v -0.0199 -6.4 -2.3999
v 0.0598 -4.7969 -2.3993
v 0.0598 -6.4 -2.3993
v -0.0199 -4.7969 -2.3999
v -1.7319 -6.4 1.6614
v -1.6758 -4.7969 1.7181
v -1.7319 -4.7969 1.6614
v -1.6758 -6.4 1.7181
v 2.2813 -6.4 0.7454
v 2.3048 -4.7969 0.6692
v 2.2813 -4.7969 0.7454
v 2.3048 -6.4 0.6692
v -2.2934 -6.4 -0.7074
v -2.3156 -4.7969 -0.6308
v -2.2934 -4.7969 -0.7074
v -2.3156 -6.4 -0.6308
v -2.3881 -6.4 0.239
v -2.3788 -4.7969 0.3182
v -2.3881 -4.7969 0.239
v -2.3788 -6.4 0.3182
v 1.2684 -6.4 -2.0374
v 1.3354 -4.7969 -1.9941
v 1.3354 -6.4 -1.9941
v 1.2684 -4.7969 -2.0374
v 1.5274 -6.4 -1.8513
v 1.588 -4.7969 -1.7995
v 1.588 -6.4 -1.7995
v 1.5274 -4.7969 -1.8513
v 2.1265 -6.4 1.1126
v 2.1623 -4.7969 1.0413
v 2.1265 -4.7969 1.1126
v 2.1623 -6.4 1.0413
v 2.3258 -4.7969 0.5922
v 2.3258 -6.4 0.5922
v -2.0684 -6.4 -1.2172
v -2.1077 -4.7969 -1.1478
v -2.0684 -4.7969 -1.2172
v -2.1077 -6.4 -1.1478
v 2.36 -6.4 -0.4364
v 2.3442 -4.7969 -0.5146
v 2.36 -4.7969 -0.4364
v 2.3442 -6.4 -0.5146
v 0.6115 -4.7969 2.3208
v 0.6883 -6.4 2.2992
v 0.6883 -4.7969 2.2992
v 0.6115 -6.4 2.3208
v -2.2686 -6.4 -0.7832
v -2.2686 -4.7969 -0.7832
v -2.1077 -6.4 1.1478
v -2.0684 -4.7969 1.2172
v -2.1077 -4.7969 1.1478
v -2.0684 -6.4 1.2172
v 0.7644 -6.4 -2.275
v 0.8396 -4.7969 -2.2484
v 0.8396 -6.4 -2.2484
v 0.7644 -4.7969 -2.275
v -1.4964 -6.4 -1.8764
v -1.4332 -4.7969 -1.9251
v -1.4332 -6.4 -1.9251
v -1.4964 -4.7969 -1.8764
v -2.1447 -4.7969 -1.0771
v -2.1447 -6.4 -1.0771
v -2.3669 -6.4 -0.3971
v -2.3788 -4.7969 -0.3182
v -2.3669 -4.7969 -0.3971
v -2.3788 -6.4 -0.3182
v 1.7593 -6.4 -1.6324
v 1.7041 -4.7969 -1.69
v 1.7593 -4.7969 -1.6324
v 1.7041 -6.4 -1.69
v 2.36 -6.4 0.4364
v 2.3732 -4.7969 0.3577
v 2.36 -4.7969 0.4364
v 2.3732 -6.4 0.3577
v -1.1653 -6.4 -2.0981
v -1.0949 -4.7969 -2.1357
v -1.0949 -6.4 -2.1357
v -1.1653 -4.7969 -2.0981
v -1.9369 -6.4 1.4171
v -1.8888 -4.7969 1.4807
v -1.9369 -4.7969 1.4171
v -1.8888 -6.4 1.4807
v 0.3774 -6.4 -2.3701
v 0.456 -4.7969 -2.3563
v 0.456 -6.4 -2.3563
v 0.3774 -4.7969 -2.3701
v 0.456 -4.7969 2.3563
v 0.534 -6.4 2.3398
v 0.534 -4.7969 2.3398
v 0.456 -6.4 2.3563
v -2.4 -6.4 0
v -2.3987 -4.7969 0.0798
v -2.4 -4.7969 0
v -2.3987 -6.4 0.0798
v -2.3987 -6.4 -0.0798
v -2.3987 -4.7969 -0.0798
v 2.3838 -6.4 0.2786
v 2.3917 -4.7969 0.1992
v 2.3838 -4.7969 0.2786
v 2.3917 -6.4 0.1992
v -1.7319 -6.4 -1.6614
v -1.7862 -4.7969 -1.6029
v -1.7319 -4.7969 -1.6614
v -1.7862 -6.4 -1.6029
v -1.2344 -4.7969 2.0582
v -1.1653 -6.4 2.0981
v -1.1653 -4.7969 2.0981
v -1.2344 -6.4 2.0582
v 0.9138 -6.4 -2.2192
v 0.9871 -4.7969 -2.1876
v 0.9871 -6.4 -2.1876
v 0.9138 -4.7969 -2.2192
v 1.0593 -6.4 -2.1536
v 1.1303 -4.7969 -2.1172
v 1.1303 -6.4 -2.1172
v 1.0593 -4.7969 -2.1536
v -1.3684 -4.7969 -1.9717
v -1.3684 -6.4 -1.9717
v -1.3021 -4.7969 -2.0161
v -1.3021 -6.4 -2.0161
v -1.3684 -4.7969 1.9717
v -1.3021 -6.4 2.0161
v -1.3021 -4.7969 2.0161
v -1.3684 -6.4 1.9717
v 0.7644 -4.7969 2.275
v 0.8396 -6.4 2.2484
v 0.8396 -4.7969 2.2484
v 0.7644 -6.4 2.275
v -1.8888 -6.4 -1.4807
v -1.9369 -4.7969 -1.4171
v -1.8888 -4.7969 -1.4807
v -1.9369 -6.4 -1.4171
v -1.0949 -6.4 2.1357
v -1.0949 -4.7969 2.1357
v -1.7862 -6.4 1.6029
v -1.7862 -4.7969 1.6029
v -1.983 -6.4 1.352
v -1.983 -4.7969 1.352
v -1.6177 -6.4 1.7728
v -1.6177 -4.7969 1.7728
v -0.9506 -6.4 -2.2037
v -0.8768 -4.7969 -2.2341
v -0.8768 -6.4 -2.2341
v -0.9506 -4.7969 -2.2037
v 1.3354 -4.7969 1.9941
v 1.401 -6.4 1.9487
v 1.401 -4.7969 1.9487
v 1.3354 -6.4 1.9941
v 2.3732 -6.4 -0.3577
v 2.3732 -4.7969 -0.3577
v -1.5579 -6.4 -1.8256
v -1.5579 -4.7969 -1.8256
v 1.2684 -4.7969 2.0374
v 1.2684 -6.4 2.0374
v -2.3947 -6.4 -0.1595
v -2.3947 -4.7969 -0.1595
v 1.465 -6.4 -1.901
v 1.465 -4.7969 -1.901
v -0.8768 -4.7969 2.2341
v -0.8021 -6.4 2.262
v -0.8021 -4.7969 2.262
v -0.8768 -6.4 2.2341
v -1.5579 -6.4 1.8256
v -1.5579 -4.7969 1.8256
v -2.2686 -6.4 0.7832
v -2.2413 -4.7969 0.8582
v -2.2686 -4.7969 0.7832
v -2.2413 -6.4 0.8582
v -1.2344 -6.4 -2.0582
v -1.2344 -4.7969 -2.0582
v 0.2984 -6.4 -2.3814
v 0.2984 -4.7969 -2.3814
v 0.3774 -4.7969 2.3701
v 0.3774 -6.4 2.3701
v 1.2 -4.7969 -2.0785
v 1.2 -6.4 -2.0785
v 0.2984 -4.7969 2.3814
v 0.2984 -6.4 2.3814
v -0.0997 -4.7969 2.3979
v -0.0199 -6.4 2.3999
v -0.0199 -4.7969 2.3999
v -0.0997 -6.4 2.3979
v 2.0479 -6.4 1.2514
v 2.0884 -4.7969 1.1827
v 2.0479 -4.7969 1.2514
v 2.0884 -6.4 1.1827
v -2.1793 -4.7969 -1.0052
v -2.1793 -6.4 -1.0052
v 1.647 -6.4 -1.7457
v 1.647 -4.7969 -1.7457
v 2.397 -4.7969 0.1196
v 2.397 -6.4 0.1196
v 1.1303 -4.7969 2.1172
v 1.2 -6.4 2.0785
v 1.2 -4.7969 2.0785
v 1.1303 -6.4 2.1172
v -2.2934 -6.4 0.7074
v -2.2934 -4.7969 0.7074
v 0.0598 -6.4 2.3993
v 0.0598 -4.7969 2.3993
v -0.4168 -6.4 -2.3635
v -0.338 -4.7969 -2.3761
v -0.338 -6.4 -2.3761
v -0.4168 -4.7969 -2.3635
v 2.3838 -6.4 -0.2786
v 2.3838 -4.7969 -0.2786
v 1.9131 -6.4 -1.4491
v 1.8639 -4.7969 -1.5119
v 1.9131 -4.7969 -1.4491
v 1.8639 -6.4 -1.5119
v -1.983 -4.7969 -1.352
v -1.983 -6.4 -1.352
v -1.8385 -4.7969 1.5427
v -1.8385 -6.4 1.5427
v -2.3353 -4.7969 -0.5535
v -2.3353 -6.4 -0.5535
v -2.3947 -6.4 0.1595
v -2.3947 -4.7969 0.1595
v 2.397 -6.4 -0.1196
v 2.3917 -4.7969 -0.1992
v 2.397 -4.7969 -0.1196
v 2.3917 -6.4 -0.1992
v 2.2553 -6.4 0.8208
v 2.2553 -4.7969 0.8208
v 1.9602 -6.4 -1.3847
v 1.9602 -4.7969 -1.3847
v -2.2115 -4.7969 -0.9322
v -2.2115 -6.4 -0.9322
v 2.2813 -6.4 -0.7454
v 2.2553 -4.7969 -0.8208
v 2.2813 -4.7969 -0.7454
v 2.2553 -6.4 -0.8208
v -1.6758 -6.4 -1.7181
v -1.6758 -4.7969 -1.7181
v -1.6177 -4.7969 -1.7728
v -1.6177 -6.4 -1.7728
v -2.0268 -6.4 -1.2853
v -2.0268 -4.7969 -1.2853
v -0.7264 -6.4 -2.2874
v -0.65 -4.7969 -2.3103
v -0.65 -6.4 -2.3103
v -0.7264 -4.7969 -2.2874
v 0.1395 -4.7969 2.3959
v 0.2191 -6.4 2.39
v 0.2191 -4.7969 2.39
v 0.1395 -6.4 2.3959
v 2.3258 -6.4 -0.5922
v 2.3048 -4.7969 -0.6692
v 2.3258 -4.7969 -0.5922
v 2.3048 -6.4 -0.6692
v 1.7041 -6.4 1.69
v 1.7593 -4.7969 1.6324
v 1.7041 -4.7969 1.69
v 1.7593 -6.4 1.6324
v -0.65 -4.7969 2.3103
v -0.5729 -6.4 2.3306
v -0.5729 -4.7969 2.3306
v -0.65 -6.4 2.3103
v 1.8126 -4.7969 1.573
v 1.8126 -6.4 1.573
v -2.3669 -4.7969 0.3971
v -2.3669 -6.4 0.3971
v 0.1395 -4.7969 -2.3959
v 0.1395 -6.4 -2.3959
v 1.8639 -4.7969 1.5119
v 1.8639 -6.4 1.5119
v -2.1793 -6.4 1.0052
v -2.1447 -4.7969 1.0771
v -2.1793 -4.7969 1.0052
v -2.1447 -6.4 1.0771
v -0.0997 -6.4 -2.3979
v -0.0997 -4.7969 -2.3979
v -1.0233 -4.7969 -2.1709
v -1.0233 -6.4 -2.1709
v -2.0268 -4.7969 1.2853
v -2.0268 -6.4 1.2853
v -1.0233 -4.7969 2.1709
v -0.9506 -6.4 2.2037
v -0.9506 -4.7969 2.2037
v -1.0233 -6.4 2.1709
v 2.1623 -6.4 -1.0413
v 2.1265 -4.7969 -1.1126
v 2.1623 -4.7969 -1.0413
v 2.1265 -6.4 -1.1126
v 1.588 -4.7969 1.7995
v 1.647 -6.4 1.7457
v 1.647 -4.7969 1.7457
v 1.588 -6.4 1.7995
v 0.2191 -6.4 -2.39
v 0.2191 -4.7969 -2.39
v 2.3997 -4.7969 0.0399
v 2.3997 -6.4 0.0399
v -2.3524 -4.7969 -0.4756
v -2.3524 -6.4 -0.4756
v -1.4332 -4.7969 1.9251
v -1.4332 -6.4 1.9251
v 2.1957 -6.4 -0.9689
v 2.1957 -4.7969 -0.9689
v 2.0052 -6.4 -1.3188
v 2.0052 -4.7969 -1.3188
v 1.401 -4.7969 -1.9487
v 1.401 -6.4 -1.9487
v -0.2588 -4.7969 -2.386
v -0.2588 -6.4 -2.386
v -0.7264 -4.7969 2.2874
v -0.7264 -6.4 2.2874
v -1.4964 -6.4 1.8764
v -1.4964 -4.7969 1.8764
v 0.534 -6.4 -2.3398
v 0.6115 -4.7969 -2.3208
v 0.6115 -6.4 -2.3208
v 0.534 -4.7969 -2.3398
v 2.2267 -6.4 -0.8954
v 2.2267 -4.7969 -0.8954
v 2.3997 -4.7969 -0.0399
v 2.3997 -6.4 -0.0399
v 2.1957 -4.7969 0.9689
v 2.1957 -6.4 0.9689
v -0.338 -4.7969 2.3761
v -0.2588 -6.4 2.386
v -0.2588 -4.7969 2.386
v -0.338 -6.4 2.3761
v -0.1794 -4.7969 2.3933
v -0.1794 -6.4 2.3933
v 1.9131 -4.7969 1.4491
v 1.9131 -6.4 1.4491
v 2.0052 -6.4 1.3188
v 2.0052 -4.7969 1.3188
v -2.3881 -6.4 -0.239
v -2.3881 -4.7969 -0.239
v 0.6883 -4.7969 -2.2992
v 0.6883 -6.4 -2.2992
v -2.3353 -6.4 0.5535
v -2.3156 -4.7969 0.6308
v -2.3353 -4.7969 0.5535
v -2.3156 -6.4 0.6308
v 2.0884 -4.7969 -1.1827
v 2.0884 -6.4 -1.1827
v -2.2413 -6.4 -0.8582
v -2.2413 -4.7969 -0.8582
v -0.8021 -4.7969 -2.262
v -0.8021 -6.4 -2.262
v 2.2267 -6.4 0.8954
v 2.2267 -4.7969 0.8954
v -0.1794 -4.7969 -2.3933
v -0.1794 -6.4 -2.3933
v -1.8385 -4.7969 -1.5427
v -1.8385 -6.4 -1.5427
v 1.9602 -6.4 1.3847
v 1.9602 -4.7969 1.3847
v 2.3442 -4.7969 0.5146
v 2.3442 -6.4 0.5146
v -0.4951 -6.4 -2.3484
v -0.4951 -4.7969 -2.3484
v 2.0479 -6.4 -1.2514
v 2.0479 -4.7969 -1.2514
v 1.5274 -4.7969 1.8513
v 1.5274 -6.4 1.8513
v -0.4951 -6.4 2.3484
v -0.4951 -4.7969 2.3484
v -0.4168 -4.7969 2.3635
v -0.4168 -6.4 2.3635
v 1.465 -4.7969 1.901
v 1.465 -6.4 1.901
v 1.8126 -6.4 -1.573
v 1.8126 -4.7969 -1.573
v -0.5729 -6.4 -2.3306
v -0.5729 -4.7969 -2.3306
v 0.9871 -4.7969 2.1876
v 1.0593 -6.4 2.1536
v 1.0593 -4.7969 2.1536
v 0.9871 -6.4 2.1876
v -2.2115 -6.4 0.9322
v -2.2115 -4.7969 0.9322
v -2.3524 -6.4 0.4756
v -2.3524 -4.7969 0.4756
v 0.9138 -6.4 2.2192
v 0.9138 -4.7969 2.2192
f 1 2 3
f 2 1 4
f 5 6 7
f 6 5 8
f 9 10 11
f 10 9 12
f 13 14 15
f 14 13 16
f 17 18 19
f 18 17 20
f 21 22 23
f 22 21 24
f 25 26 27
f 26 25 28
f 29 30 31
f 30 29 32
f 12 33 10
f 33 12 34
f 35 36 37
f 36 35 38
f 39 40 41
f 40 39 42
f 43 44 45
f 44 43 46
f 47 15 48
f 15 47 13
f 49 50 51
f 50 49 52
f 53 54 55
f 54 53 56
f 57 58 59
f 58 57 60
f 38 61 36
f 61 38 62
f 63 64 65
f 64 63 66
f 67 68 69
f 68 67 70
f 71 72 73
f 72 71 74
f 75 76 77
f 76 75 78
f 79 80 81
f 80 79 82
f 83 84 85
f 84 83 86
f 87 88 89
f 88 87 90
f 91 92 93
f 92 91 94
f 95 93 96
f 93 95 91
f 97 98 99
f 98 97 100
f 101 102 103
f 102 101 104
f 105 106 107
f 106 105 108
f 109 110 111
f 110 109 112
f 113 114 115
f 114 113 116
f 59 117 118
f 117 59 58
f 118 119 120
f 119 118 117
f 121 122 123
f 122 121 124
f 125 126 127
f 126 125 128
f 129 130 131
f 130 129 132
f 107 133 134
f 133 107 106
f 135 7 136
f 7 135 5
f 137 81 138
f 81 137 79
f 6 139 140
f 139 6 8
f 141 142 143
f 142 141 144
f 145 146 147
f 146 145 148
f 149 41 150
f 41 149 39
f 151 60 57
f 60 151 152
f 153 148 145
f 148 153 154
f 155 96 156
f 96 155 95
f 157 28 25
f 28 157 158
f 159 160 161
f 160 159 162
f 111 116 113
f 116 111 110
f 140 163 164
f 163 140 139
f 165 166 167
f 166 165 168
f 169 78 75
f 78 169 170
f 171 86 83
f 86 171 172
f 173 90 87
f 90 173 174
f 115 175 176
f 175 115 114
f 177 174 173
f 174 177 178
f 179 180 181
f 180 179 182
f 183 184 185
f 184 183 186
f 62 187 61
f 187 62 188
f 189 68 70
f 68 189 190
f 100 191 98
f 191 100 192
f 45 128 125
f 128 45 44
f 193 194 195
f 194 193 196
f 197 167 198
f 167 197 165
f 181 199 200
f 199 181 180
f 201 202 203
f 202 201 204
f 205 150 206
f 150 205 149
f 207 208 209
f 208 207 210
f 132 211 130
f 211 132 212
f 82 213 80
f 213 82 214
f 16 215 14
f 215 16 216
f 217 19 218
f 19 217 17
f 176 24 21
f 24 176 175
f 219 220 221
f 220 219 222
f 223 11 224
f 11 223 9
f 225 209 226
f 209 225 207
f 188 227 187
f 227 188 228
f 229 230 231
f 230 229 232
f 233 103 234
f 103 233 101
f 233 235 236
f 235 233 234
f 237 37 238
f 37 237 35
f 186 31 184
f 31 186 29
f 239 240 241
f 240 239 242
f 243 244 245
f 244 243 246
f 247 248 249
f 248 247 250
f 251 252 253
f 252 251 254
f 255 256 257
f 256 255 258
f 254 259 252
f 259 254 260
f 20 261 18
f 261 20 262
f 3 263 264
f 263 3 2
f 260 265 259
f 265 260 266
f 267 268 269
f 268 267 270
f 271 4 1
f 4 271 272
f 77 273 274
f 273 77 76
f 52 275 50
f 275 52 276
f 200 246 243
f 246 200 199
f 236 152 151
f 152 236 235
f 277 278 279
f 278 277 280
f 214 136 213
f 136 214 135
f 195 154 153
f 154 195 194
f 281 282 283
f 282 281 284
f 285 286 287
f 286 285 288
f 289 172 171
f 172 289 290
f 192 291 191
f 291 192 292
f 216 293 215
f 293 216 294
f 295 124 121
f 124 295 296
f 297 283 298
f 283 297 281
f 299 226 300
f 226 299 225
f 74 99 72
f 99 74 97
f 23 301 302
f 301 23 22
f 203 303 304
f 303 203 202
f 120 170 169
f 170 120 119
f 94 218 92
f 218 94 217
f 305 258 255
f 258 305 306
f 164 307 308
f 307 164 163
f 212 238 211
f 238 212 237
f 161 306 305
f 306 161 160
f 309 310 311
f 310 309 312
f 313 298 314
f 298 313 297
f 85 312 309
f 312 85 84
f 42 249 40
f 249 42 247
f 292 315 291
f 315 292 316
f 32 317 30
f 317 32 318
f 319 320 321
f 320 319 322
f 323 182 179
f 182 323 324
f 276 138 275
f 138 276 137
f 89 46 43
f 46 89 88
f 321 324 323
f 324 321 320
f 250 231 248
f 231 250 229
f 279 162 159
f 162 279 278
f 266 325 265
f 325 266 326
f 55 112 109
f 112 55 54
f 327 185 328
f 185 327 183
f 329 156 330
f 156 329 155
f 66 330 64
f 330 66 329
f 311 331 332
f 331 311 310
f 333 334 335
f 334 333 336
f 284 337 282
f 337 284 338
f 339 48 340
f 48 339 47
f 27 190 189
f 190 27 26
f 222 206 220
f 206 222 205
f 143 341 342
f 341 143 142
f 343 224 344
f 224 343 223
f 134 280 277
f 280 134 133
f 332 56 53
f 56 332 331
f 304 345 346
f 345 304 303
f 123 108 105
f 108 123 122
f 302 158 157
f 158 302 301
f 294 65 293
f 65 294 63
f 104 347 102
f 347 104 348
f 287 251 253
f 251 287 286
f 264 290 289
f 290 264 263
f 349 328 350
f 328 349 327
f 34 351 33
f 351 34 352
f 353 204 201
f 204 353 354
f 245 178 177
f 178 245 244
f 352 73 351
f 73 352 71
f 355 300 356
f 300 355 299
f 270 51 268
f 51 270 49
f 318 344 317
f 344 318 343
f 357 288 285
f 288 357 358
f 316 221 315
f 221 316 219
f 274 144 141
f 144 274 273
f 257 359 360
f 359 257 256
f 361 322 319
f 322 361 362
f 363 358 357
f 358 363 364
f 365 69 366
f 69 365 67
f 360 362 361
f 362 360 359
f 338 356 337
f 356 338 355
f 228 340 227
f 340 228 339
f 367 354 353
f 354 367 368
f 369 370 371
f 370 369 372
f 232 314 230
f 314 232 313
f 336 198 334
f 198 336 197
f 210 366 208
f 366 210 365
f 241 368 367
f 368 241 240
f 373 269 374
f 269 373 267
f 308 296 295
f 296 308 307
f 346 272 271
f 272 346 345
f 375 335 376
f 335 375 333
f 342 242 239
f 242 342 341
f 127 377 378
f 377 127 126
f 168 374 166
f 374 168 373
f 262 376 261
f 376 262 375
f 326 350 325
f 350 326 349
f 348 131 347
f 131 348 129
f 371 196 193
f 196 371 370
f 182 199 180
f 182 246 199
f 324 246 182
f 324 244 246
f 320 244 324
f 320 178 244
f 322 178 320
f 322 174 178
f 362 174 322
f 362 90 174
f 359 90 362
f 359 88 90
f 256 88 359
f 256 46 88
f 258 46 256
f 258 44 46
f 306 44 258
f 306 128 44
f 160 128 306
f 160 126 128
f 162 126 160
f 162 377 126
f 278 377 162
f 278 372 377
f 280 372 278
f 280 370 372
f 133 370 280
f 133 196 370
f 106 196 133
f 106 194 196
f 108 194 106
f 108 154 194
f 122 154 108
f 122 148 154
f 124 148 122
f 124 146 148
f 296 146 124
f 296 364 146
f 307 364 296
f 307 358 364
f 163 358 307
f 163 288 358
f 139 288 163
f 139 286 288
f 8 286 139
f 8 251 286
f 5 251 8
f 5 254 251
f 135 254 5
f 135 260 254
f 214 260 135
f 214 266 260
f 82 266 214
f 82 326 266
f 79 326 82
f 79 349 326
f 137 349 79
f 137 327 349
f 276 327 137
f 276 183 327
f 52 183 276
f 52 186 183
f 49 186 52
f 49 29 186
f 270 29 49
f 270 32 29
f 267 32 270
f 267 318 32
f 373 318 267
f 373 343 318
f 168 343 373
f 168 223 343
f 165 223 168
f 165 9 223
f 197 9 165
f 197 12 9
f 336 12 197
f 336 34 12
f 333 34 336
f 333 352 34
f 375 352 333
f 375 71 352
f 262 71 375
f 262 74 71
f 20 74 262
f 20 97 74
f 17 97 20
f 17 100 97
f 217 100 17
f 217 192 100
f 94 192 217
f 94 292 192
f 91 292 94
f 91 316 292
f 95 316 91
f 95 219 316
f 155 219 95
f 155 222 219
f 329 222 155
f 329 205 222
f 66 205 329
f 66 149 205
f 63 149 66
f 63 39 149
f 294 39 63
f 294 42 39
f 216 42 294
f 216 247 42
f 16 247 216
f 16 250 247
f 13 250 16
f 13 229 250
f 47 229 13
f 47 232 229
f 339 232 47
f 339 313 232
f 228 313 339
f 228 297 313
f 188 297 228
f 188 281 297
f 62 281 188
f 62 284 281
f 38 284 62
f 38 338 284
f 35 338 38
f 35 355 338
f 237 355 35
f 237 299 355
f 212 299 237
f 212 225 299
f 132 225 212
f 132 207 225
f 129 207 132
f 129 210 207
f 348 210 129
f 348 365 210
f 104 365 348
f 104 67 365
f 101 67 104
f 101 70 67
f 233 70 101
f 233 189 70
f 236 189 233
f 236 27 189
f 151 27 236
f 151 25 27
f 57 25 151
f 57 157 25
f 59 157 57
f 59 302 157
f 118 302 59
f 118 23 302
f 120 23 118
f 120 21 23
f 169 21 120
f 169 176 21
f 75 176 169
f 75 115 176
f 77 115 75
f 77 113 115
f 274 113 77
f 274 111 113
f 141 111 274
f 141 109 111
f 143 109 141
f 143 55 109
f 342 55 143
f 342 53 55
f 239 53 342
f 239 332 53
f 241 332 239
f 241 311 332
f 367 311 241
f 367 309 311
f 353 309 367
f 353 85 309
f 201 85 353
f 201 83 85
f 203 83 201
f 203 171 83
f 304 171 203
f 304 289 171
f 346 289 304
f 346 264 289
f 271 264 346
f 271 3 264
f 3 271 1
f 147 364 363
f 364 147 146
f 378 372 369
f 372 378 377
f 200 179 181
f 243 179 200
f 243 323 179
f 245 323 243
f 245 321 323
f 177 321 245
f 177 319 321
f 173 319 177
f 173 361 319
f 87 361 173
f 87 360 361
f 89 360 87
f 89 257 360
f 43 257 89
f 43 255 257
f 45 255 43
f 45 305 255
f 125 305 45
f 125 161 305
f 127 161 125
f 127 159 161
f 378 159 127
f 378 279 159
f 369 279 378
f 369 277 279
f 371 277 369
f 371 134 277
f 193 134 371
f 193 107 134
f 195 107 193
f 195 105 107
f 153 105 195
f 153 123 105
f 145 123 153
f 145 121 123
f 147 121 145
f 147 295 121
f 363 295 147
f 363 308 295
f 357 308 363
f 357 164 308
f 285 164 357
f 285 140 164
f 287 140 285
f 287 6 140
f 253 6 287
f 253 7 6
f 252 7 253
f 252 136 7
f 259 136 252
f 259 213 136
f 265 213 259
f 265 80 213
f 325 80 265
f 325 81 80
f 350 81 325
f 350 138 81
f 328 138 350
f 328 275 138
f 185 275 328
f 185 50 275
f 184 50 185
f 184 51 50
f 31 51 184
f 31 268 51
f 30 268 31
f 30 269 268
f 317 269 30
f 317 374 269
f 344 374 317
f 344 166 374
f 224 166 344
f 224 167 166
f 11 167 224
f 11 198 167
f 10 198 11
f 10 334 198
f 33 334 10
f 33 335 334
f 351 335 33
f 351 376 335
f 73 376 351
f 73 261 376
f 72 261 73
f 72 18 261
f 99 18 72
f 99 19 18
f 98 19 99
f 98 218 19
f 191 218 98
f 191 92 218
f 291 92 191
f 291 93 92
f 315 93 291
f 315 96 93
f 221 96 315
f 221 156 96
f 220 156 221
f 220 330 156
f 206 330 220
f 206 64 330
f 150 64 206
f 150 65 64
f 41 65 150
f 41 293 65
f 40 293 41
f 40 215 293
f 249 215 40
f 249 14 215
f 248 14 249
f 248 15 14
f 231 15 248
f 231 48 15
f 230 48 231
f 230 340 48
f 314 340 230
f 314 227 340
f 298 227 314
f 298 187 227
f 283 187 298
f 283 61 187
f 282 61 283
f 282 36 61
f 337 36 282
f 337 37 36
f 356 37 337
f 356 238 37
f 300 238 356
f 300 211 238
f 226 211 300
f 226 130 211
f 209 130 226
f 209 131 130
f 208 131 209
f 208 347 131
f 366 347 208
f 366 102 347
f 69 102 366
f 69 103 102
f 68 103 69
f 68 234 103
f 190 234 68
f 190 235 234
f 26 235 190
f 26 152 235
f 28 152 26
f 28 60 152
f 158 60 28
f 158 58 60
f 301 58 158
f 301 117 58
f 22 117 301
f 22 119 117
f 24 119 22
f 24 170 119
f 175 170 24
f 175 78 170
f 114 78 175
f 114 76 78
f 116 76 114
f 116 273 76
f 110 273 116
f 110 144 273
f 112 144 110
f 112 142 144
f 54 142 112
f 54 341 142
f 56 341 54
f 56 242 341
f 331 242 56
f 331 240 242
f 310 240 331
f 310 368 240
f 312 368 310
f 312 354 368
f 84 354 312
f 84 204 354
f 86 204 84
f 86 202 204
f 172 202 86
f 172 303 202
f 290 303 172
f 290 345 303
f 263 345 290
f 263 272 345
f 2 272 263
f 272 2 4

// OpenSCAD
use <../lib.scad>
use <../p/4-4cylo.scad>
use <../p/4-4ring1.scad>
use <s/243s01.scad>
$fa=1; $fs=0.2;
function ldraw_lib__243(realsolid=false) = [
// 0 ~Train Wheel Spoked with Cylindrical Rim with 8 LDU Axle Hole
// 0 Name: 243.dat
// 0 Author: Niels Karsdorp [nielsk]
// 0 !LDRAW_ORG Part UPDATE 2022-03
// 0 !LICENSE Licensed under CC BY 2.0 and CC BY 4.0 : see CAreadme.txt
// 
// 0 BFC CERTIFY CCW
  [0,"BFC","CERTIFY"],
  [0,"BFC","CCW"],
// 
// 0 !HISTORY 2011-07-25 [PTadmin] Official Update 2011-01
// 0 !HISTORY 2018-03-14 [Holly-Wood] Changed description, fixed flat-scaled primitives, fixed comments, inverted winding to CCW, rotated stud, fixed spokes
// 0 !HISTORY 2019-12-27 [PTadmin] Official Update 2019-03
// 0 !HISTORY 2021-06-10 [Holly-Wood] Subfiled, changed description
// 0 !HISTORY 2022-05-07 [PTadmin] Official Update 2022-03
// 
// 
// 0 // Subfile
// 1 16 0 0 0 1 0 0 0 1 0 0 0 1 s\243s01.dat
  [1,16,0,0,0,1,0,0,0,1,0,0,0,1, ldraw_lib__s__243s01(realsolid)],
// 
// 0 // Axle connector
// 1 16 0 0 10 -4 0 0 0 0 4 0 -1 0 4-4ring1.dat
  [1,16,0,0,10,-4,0,0,0,0,4,0,-1,0, ldraw_lib__4_4ring1(realsolid)],
// 0 BFC INVERTNEXT
  [0,"BFC","INVERTNEXT"],
// 1 16 0 0 10 4 0 0 0 0 4 0 -18 0 4-4cylo.dat
  [1,16,0,0,10,4,0,0,0,0,4,0,-18,0, ldraw_lib__4_4cylo(realsolid)],
];
module ldraw_lib__243(step=0, col=false, unit=2/5, alt=false, line=0.2, solid=!$preview)
    makepoly(ldraw_lib__243(solid), step=step, col=col, unit=unit, alt=alt, line=line, solid=solid);
ldraw_lib__243(line=0.2);
